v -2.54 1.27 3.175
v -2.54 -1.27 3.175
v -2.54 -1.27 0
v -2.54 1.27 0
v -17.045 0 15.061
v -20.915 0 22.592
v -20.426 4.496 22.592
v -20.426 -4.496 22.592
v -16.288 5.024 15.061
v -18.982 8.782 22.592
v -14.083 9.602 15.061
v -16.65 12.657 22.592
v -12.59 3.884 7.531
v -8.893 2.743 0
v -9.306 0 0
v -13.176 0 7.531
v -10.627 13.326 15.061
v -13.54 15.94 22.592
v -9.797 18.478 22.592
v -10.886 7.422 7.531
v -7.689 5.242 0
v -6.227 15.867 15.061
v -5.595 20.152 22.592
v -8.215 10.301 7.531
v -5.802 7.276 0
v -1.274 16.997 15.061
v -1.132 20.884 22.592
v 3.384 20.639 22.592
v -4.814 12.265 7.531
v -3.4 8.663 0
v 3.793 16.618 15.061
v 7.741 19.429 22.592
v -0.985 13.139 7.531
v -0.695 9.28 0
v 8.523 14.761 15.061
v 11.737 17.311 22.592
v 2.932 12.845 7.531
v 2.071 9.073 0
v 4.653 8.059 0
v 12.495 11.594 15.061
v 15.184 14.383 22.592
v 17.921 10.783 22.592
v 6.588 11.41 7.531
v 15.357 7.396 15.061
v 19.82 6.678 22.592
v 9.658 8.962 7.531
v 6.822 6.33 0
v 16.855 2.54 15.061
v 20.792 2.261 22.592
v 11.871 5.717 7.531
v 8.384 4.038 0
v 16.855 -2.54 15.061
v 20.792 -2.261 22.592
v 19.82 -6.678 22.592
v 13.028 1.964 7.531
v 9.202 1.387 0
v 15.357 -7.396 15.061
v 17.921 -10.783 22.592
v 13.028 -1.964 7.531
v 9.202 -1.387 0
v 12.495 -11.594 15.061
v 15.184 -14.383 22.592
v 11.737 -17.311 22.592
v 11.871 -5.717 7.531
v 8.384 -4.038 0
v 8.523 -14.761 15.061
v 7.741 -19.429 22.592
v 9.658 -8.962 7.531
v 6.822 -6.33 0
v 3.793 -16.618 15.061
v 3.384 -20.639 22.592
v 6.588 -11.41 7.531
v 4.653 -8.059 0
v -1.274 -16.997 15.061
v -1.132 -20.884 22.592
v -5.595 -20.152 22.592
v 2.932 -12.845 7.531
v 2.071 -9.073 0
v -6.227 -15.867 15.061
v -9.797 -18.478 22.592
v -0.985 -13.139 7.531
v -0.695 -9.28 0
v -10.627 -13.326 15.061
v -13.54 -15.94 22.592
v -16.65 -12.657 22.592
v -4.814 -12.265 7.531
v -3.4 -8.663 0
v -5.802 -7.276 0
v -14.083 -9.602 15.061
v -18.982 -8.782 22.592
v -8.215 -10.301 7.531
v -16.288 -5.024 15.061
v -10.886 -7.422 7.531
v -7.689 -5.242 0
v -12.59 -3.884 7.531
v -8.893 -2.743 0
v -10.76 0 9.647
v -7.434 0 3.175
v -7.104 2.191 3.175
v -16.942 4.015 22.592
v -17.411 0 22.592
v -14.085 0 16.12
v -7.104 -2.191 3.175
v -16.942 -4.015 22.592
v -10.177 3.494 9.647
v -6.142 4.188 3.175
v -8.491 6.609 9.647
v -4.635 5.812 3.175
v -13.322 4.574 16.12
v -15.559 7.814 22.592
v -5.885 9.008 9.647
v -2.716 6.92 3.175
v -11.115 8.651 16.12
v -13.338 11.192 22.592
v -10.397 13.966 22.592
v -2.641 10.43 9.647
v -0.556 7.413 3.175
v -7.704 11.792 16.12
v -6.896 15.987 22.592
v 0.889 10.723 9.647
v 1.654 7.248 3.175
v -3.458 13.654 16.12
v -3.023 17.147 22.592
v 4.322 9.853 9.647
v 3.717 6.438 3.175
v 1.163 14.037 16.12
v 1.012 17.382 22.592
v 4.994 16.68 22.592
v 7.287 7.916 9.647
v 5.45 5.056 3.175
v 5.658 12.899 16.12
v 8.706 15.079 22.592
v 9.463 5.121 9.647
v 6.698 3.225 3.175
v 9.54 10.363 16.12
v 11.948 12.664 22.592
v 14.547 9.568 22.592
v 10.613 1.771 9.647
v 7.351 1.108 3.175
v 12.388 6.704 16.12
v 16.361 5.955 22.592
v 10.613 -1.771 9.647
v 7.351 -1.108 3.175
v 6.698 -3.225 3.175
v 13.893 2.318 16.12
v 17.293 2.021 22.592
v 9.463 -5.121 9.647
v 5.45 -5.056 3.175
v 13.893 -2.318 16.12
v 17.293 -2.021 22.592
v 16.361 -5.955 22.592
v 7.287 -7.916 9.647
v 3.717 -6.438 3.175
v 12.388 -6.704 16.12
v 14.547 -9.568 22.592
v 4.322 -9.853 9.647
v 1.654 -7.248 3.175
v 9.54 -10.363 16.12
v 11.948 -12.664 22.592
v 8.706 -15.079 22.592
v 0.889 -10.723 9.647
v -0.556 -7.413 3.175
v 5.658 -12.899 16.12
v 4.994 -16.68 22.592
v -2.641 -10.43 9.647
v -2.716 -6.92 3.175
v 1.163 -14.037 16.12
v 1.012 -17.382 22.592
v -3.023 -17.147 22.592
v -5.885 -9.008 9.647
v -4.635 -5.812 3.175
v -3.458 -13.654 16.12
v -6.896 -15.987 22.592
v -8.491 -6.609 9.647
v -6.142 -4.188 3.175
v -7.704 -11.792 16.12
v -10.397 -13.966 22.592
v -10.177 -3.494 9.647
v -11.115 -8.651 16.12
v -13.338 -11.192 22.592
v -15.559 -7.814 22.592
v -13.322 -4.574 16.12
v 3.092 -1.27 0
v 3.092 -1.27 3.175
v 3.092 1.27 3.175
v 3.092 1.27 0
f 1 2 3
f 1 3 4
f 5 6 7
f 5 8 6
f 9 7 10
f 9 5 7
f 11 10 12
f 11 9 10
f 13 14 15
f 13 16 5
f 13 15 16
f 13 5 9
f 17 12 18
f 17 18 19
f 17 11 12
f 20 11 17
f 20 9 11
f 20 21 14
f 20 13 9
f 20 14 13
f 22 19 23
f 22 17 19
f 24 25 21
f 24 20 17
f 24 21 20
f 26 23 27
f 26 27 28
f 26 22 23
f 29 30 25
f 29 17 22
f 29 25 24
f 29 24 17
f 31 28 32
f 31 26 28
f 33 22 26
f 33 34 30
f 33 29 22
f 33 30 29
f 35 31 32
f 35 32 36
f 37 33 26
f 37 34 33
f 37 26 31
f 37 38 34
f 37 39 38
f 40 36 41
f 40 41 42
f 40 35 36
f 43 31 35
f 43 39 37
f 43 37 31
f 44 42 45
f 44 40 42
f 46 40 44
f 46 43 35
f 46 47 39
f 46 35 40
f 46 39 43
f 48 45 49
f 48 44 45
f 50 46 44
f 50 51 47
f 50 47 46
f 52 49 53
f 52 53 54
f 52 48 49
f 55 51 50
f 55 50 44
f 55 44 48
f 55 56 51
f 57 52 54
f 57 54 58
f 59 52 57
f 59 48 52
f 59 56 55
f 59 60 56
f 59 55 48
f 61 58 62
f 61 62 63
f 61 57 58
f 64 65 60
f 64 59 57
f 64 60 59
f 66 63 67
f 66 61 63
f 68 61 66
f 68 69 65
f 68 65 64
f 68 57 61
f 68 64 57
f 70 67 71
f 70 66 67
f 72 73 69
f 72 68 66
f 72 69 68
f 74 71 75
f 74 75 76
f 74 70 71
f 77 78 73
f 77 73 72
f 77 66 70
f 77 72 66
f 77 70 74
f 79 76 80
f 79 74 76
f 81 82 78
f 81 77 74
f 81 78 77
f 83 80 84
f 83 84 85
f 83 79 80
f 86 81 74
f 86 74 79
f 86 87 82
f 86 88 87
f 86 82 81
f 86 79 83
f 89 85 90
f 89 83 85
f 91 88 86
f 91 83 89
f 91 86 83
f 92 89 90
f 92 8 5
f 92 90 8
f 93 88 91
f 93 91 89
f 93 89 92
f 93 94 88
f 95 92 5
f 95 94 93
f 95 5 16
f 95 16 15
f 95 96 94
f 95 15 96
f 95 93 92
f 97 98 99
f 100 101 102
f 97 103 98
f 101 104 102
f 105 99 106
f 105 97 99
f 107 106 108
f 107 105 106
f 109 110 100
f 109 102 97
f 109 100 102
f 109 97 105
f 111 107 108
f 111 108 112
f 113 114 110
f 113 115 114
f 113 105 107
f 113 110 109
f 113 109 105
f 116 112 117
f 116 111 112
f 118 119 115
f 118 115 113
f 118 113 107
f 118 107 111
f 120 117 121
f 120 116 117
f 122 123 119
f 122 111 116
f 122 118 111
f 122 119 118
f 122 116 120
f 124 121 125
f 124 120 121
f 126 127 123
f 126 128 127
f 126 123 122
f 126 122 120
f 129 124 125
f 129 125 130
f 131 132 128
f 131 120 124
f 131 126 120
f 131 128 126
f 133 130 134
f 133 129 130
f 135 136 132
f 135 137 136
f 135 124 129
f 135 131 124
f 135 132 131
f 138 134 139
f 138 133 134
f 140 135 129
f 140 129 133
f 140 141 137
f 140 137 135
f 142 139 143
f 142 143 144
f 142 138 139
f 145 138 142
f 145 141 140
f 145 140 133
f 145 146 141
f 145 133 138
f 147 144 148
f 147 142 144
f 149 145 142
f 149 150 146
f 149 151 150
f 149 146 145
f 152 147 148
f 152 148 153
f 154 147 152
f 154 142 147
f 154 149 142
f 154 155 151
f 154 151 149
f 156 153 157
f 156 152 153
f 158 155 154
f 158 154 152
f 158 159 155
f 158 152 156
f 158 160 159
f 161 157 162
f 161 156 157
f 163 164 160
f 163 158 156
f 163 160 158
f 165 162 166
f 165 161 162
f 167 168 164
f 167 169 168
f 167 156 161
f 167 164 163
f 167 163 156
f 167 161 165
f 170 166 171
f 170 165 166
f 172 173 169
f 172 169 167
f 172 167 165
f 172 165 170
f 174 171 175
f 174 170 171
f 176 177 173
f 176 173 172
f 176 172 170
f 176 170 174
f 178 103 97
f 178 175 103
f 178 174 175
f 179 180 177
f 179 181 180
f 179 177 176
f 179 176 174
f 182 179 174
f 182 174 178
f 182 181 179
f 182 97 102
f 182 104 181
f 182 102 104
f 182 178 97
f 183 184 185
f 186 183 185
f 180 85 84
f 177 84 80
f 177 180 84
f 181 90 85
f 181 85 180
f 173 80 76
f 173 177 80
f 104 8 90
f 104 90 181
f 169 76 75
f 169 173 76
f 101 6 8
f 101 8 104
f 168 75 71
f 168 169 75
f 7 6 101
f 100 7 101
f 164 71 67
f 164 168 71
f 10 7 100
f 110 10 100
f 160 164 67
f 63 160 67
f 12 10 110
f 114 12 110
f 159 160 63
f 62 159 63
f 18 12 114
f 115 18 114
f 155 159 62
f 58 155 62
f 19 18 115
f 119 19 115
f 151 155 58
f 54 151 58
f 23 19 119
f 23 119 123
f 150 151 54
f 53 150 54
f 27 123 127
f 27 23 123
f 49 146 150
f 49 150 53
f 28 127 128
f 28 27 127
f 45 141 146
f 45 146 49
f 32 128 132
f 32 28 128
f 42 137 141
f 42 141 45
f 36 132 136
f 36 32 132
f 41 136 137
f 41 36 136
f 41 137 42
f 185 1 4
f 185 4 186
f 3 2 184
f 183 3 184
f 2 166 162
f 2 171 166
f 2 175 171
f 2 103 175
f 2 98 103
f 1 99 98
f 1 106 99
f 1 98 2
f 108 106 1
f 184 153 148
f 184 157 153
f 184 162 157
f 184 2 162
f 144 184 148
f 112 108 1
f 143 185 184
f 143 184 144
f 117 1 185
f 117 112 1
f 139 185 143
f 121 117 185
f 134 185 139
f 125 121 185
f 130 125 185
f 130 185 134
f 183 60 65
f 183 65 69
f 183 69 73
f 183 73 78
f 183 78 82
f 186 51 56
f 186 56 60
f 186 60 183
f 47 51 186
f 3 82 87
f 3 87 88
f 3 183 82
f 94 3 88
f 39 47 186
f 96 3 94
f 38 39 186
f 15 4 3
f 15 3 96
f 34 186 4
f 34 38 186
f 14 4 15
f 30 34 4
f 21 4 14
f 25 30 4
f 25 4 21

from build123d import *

# Parameters (mm, degrees)
F2_W     = 5.632173
F2_H     = 2.54
F3_DEPTH = 25.4


with BuildPart() as f1:
    # F0 (on Front) → F1 (revolve)
    with BuildSketch(Plane.XZ):
        Polygon((-9.306035, 0), (0, 0), (0, 3.175), (-7.434009, 3.175), (-17.411153, 22.59206), (-20.914602, 22.59206), align=None)
    revolve(axis=Axis((0, 0, 1.5875), (0, 0, -1)))

    # F2 (on face) → F3 (cut)
    with BuildSketch(Plane.XY.offset(3.175)):
        with Locations((0.276086, 0)):
            Rectangle(F2_W, F2_H)
    extrude(amount=-F3_DEPTH, mode=Mode.SUBTRACT)


solid = f1.part
